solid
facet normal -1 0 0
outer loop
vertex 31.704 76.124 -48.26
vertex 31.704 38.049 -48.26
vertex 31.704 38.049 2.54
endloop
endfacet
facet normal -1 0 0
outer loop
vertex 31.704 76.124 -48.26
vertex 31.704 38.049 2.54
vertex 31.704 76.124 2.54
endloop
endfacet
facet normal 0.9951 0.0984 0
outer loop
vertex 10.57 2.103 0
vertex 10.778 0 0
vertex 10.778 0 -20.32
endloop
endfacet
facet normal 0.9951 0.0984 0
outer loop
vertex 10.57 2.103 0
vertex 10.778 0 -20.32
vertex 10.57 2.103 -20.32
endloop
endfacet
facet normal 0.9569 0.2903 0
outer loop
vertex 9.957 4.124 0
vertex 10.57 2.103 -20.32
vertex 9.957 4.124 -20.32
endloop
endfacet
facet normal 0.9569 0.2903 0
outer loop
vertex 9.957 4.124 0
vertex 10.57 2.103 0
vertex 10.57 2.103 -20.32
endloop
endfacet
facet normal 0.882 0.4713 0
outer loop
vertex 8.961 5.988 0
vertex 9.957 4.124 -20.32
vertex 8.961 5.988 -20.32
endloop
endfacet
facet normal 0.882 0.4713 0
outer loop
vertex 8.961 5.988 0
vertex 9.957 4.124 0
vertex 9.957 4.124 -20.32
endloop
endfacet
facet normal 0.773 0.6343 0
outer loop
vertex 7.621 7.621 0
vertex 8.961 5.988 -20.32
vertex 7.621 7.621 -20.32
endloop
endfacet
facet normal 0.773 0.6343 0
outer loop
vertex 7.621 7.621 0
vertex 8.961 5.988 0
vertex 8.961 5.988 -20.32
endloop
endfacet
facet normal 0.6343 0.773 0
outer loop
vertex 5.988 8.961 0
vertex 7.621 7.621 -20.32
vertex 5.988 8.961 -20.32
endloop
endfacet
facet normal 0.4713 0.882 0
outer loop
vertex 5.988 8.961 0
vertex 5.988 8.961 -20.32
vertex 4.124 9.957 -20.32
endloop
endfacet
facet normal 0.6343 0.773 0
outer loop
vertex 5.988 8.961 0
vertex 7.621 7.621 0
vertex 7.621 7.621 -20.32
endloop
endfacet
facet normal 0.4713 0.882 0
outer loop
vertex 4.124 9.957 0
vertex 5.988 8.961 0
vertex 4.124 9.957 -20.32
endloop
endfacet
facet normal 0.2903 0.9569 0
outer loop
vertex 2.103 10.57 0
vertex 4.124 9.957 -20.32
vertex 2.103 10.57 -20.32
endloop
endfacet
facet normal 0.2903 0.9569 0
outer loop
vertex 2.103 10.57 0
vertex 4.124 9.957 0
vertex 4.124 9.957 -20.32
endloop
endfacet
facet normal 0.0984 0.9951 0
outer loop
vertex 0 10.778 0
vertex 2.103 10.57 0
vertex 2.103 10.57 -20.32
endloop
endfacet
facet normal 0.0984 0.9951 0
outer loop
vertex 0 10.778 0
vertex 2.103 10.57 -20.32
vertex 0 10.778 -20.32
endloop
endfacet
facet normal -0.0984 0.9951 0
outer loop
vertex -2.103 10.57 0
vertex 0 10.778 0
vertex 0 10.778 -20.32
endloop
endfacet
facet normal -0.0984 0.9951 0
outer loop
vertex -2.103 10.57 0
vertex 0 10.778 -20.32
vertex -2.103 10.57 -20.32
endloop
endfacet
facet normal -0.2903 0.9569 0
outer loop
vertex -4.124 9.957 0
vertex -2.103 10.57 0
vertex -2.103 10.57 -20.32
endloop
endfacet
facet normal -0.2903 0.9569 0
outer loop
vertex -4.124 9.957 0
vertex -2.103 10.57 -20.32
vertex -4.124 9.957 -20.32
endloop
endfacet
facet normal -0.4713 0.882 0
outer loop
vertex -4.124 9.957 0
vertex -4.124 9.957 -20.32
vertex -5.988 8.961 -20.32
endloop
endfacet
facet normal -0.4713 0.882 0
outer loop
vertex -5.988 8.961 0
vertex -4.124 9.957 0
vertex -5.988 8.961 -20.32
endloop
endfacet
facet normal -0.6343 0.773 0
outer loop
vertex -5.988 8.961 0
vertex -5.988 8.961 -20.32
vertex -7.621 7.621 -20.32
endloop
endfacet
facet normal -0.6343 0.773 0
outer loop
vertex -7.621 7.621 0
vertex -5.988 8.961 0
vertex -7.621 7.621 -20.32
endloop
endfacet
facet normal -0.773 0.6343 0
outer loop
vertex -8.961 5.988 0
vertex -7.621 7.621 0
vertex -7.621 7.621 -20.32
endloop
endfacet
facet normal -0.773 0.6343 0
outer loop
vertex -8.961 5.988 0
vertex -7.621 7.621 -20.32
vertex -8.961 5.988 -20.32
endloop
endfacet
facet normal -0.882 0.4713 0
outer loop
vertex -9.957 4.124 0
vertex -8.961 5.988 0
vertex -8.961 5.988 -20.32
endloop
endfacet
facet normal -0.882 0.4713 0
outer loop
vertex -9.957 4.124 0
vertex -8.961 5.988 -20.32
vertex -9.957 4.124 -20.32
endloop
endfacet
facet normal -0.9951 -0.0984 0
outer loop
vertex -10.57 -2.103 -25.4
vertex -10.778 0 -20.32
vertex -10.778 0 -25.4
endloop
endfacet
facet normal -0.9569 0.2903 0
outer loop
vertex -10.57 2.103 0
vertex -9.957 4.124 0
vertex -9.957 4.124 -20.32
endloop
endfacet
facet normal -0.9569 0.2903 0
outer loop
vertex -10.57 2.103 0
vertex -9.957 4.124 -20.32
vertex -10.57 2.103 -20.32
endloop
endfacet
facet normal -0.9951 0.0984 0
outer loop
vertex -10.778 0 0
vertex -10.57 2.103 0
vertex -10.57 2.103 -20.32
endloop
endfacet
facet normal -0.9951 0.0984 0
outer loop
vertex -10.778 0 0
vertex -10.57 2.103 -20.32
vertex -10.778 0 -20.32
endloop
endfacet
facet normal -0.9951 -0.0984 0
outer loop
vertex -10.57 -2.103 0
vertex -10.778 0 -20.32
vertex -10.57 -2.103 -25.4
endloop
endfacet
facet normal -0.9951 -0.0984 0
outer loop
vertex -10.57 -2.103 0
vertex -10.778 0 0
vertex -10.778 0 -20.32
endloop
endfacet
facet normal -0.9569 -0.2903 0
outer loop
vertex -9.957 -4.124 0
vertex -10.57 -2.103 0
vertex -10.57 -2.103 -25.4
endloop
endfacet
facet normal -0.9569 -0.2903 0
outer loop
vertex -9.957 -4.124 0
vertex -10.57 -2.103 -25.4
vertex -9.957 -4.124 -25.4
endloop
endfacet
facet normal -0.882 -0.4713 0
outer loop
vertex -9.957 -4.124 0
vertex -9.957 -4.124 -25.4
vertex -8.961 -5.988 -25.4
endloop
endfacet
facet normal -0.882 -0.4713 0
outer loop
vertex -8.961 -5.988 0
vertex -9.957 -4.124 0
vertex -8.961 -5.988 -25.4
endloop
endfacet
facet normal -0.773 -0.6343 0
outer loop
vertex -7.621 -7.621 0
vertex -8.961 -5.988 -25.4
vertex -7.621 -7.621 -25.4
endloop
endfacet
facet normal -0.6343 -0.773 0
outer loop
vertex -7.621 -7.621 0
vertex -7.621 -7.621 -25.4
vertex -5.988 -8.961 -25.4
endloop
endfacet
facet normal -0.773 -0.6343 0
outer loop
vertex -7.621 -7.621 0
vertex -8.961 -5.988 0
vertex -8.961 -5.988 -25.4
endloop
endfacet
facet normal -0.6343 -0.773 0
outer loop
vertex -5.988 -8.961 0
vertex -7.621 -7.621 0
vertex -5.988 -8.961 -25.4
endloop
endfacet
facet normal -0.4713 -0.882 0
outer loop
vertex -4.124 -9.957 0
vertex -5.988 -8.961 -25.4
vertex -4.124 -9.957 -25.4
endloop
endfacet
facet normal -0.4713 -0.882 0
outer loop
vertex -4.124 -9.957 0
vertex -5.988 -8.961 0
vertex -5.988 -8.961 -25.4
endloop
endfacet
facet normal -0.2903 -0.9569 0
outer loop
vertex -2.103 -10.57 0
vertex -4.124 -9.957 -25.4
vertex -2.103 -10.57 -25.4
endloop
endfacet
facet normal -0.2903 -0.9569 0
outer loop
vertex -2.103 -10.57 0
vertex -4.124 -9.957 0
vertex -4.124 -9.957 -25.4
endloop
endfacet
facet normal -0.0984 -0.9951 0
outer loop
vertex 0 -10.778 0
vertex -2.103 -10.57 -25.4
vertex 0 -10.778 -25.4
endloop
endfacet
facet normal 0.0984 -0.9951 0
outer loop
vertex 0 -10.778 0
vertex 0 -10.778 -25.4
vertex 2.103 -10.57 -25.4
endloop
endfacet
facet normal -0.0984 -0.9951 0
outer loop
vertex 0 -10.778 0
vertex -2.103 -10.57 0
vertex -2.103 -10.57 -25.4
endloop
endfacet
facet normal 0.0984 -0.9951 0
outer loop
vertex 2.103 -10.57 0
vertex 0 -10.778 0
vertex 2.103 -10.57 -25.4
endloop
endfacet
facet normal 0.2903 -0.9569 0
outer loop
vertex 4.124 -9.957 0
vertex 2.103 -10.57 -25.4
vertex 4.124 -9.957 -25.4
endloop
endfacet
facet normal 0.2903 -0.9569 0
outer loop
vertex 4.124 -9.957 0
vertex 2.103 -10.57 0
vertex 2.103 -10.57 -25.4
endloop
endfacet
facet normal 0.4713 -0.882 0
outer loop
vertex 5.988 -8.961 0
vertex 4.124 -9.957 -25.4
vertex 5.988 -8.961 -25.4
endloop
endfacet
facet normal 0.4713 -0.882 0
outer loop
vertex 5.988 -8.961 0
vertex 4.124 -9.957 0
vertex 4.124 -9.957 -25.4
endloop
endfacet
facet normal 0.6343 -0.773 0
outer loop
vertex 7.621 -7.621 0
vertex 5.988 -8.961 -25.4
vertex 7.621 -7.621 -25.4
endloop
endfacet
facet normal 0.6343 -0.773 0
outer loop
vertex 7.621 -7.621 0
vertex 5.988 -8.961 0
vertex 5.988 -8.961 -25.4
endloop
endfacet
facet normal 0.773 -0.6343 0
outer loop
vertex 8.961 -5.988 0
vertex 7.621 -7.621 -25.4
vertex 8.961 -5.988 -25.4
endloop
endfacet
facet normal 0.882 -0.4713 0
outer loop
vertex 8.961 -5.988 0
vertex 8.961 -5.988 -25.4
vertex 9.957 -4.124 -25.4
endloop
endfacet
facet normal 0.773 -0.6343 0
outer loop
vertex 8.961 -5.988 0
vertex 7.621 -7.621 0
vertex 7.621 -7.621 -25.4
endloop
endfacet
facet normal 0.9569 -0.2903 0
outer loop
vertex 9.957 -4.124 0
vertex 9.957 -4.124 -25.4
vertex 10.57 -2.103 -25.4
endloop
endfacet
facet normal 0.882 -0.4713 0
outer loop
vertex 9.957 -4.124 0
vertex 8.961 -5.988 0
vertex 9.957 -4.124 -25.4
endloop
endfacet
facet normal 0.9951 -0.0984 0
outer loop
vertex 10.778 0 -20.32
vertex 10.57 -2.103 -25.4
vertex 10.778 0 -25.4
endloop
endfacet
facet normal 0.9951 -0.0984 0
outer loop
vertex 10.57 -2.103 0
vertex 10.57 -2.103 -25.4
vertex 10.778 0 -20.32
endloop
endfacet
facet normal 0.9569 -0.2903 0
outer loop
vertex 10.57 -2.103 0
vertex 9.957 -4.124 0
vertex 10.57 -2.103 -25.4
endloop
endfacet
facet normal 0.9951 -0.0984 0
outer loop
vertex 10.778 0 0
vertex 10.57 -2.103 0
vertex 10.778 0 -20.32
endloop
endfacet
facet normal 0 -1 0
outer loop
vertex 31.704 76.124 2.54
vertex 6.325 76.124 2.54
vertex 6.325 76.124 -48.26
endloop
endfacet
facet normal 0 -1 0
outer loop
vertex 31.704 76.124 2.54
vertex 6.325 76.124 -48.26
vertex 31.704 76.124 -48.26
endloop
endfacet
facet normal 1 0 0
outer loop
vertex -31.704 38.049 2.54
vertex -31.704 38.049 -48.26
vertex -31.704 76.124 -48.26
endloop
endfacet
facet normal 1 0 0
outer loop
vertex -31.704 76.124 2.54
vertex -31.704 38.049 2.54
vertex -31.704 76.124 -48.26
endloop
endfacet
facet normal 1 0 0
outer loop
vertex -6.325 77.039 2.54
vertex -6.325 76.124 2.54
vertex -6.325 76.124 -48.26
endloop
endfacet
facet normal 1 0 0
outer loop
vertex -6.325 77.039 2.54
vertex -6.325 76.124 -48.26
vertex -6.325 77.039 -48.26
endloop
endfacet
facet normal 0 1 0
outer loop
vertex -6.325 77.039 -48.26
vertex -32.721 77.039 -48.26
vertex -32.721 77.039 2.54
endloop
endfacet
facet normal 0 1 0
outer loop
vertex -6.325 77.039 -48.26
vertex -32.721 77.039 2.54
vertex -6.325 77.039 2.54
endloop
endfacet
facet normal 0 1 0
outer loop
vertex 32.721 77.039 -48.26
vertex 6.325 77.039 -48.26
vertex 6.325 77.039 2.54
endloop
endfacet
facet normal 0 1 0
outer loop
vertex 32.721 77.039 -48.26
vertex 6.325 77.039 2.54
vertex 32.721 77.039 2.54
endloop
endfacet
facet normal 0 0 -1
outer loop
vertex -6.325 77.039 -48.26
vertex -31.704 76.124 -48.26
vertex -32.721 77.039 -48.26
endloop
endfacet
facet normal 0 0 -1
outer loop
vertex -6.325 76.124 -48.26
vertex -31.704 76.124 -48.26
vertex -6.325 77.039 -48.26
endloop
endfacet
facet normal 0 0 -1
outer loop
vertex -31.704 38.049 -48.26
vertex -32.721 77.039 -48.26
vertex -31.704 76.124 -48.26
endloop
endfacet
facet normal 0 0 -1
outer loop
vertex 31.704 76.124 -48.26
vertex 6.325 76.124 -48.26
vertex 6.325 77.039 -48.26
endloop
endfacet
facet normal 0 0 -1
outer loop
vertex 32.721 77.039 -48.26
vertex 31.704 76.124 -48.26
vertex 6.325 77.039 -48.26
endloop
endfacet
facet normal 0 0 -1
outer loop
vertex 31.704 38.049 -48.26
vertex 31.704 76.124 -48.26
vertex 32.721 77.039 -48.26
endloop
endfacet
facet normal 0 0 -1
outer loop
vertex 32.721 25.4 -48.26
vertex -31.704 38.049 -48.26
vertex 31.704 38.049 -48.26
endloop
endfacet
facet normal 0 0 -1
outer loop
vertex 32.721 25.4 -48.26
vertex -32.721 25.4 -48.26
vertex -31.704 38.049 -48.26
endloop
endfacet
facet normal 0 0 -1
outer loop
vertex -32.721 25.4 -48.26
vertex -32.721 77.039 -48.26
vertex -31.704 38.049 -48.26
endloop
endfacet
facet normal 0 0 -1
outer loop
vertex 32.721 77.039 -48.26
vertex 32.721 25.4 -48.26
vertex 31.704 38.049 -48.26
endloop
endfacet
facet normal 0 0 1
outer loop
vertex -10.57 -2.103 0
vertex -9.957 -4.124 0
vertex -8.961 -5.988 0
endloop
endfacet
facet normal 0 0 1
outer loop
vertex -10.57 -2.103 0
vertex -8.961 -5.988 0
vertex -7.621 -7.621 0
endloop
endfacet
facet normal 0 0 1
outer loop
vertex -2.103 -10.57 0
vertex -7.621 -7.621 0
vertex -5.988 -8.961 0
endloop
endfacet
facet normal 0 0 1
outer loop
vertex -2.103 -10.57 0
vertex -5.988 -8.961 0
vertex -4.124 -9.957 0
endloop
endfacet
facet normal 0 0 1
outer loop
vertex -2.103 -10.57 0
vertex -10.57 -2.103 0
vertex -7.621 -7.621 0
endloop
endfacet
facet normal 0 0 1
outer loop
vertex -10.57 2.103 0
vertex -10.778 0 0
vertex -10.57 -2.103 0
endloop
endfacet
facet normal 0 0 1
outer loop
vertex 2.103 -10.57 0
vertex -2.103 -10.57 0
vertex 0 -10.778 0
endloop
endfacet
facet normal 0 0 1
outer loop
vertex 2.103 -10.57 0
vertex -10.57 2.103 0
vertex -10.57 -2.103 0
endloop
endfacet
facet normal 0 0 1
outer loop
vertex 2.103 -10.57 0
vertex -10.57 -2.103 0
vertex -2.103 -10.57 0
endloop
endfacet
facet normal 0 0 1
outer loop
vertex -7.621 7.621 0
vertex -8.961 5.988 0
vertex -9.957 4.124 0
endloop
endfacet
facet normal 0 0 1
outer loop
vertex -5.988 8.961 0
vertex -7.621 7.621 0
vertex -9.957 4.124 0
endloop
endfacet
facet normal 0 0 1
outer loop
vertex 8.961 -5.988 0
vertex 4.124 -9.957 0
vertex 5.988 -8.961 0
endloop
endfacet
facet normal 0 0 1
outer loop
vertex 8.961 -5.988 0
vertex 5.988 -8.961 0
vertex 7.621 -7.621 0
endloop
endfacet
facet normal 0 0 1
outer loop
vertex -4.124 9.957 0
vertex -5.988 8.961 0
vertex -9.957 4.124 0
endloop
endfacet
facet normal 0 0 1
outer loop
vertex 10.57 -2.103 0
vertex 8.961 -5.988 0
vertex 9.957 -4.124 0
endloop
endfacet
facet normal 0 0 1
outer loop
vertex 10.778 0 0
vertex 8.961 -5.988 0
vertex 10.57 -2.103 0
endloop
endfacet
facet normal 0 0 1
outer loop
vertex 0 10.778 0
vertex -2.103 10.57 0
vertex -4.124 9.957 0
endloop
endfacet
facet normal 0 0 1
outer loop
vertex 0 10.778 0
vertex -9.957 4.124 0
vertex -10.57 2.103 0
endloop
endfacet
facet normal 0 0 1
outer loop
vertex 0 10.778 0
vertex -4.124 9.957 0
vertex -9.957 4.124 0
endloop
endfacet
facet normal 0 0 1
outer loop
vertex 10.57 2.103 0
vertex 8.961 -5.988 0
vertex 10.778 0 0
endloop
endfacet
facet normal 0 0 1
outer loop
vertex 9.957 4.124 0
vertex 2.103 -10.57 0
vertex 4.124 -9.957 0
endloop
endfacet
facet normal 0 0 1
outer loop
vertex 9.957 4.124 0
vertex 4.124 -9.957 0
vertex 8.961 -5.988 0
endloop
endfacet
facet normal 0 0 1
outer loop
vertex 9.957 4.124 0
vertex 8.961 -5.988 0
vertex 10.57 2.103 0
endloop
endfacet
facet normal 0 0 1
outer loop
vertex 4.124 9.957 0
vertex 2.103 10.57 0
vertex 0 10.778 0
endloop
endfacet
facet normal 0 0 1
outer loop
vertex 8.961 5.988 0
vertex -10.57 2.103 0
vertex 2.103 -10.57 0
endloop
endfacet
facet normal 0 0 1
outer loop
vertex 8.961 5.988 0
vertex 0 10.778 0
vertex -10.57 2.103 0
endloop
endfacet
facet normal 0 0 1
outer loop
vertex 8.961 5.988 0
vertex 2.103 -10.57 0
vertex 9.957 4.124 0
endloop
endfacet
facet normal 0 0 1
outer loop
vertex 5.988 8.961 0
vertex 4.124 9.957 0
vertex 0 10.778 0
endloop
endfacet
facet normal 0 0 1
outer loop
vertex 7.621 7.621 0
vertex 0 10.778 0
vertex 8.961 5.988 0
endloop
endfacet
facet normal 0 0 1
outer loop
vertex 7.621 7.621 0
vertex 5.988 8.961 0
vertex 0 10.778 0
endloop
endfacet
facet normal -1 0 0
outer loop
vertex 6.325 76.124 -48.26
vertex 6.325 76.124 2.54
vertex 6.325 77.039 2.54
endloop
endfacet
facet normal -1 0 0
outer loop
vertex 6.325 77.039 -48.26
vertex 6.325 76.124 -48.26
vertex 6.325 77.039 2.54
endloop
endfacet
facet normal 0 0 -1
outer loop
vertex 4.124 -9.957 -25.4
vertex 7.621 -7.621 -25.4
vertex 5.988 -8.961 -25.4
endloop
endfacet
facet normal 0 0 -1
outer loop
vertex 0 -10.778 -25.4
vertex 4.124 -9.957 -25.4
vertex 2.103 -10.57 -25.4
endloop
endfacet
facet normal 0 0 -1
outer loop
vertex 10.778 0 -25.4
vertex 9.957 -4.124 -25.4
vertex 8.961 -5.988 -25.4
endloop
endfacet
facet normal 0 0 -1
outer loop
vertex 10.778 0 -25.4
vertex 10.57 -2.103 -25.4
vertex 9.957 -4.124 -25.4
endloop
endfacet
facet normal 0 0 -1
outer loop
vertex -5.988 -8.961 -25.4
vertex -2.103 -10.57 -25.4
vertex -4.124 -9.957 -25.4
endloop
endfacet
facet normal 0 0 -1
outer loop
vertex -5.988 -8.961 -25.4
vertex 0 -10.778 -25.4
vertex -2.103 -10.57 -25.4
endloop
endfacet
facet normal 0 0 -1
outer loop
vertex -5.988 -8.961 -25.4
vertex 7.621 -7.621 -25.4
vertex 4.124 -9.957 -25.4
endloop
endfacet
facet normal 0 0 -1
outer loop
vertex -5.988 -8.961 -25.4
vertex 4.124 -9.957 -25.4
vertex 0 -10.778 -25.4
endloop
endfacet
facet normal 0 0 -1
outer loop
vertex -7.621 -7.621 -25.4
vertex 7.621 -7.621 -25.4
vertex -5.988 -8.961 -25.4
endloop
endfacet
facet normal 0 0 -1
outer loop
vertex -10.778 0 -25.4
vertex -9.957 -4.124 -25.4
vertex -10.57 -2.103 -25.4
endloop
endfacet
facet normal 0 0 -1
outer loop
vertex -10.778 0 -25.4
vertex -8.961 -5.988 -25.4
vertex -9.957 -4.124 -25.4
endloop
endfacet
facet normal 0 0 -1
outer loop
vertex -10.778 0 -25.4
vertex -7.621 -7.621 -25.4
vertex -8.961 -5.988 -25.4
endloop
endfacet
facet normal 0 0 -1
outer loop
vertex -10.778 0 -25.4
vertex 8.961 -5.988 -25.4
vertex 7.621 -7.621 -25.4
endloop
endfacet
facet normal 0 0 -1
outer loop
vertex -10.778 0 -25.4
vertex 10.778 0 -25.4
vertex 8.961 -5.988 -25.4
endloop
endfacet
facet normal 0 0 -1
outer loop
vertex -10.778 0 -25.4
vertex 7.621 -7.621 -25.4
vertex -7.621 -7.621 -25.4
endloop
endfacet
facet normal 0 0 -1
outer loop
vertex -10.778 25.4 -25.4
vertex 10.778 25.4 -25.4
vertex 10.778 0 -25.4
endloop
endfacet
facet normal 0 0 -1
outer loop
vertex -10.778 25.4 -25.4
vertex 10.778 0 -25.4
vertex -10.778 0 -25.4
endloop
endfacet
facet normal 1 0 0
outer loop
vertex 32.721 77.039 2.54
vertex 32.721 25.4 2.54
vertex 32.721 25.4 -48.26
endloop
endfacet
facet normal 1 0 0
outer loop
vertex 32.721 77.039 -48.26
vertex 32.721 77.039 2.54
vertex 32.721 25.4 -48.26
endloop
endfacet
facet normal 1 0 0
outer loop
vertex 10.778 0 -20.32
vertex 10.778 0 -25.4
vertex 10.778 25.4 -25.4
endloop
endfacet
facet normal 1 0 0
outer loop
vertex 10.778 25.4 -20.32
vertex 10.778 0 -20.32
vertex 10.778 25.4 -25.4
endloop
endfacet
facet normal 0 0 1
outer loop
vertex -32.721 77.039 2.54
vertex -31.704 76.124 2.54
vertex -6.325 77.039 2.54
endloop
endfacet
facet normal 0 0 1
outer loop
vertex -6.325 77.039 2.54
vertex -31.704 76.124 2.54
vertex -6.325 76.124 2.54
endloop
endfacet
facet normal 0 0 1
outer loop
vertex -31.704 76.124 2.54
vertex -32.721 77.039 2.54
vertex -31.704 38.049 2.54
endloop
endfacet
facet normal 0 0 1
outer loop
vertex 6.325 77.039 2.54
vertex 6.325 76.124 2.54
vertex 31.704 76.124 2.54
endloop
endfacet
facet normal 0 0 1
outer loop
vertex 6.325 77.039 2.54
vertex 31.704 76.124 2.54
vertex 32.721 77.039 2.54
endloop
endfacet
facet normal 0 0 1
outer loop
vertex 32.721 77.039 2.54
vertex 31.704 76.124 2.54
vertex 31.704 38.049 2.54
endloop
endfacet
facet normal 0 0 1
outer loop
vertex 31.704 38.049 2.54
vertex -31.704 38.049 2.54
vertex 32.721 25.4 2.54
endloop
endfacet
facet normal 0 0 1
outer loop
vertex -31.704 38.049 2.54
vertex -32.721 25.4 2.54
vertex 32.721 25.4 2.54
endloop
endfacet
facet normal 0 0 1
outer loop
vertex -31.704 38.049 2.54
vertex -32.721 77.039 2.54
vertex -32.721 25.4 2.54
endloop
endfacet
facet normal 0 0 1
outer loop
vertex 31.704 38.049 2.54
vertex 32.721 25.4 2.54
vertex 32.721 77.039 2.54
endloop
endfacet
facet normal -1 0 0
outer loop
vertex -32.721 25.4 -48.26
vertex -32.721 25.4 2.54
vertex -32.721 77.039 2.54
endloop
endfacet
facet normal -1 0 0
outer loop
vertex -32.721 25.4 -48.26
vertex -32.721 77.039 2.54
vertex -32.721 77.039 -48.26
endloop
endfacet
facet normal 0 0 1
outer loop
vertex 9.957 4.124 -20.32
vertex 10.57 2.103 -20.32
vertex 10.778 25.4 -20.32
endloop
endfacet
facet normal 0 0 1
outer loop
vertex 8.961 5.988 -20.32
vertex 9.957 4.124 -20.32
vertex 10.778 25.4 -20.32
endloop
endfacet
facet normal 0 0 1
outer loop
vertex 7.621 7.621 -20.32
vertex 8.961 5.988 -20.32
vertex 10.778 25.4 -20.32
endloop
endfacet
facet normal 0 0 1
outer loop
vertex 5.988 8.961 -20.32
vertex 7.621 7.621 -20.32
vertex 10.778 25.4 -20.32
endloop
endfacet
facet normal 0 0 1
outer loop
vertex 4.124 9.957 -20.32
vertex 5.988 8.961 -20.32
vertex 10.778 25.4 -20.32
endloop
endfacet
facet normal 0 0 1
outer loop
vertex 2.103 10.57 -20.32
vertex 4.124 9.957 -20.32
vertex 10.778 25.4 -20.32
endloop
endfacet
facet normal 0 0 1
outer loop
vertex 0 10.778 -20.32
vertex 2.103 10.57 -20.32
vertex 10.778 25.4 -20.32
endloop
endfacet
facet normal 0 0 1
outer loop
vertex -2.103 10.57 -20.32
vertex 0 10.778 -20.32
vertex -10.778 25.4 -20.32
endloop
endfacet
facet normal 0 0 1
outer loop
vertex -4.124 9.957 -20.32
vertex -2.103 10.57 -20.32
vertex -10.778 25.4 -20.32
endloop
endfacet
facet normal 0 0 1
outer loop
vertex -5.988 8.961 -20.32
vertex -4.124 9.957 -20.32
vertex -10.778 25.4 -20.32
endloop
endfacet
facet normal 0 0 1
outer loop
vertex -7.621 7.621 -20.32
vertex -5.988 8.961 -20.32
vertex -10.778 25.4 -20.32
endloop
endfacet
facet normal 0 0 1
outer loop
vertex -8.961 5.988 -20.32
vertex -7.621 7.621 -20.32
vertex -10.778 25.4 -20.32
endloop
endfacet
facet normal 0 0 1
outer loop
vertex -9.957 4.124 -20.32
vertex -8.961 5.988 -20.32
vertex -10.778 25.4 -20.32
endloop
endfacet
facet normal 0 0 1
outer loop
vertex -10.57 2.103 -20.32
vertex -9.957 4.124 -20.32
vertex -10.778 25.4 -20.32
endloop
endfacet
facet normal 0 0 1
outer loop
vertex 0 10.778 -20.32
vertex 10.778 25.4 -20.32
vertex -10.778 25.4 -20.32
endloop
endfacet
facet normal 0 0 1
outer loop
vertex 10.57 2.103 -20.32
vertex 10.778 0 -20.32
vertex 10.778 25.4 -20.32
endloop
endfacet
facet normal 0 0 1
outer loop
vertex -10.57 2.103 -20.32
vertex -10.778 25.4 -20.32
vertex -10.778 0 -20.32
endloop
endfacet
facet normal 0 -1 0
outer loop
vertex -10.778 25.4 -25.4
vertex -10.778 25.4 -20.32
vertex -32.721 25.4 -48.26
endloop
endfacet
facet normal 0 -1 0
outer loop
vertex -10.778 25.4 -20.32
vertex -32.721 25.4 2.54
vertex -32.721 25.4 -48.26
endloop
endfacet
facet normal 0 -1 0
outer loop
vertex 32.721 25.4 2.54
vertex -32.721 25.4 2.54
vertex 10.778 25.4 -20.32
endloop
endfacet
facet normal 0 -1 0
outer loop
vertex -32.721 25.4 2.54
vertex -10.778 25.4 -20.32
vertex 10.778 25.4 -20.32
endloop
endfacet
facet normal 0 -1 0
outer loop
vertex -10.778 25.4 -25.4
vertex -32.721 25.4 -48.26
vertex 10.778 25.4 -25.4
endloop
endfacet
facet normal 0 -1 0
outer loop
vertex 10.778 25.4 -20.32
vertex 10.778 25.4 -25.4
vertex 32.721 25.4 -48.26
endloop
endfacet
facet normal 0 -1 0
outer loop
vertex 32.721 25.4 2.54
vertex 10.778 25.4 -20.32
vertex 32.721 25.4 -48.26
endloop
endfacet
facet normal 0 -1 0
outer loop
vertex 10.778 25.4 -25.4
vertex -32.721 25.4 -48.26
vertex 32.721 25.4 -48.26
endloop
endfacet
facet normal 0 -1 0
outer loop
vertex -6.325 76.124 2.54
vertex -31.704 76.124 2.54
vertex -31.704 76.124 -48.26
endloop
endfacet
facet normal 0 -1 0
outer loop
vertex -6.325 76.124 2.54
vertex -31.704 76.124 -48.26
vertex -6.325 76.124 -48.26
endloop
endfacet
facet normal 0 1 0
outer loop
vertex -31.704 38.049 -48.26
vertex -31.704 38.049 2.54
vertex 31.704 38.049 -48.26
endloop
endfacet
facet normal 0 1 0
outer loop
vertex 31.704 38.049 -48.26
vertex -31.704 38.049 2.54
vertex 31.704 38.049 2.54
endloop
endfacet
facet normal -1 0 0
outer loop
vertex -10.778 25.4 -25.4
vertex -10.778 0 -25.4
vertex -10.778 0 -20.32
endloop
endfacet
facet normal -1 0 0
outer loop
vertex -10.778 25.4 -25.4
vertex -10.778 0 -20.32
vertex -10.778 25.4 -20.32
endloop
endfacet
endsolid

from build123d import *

# Parameters (mm, degrees)
SKETCH1_R           = 10.777569686
BOSS_EXTRUDE1_DEPTH = 25.4
SKETCH2_W           = 21.555139372
SKETCH2_H           = 25.4
BOSS_EXTRUDE2_DEPTH = 5.08
SKETCH6_W           = 65.44191557
SKETCH6_H           = 50.8
BOSS_EXTRUDE3_DEPTH = 51.639420176
SKETCH7_W           = 63.40856
SKETCH7_H           = 38.0746
CUT_EXTRUDE1_DEPTH  = 98.910026756
SKETCH8_W           = 12.6492
SKETCH8_H           = 0.915620176
CUT_EXTRUDE2_DEPTH  = 98.910026756


with BuildPart() as part:
    # Sketch1 → Boss-Extrude1 (new body)
    with BuildSketch(Plane.XY):
        Circle(SKETCH1_R)
    extrude(amount=-BOSS_EXTRUDE1_DEPTH)

    # Sketch2 → Boss-Extrude2 (add)
    with BuildSketch(Plane(origin=(0, 0, -25.4), x_dir=(-1, 0, 0), z_dir=(0, 0, -1))):
        with Locations((0, 12.7)):
            Rectangle(SKETCH2_W, SKETCH2_H)
    extrude(amount=-BOSS_EXTRUDE2_DEPTH)

    # Sketch6 → Boss-Extrude3 (add)
    with BuildSketch(Plane(origin=(0, 25.4, 0), x_dir=(1, 0, 0), z_dir=(0, 1, 0))):
        with Locations((0, 22.86)):
            Rectangle(SKETCH6_W, SKETCH6_H)
    extrude(amount=BOSS_EXTRUDE3_DEPTH)

    # Sketch7 → Cut-Extrude1 (cut, through all)
    with BuildSketch(Plane.XY.offset(2.54)):
        with Locations((0, 57.0865)):
            Rectangle(SKETCH7_W, SKETCH7_H)
    extrude(amount=-CUT_EXTRUDE1_DEPTH, mode=Mode.SUBTRACT)

    # Sketch8 → Cut-Extrude2 (cut, through all)
    with BuildSketch(Plane.XY.offset(2.54)):
        with Locations((0, 76.581610088)):
            Rectangle(SKETCH8_W, SKETCH8_H)
    extrude(amount=-CUT_EXTRUDE2_DEPTH, mode=Mode.SUBTRACT)


solid = part.part
